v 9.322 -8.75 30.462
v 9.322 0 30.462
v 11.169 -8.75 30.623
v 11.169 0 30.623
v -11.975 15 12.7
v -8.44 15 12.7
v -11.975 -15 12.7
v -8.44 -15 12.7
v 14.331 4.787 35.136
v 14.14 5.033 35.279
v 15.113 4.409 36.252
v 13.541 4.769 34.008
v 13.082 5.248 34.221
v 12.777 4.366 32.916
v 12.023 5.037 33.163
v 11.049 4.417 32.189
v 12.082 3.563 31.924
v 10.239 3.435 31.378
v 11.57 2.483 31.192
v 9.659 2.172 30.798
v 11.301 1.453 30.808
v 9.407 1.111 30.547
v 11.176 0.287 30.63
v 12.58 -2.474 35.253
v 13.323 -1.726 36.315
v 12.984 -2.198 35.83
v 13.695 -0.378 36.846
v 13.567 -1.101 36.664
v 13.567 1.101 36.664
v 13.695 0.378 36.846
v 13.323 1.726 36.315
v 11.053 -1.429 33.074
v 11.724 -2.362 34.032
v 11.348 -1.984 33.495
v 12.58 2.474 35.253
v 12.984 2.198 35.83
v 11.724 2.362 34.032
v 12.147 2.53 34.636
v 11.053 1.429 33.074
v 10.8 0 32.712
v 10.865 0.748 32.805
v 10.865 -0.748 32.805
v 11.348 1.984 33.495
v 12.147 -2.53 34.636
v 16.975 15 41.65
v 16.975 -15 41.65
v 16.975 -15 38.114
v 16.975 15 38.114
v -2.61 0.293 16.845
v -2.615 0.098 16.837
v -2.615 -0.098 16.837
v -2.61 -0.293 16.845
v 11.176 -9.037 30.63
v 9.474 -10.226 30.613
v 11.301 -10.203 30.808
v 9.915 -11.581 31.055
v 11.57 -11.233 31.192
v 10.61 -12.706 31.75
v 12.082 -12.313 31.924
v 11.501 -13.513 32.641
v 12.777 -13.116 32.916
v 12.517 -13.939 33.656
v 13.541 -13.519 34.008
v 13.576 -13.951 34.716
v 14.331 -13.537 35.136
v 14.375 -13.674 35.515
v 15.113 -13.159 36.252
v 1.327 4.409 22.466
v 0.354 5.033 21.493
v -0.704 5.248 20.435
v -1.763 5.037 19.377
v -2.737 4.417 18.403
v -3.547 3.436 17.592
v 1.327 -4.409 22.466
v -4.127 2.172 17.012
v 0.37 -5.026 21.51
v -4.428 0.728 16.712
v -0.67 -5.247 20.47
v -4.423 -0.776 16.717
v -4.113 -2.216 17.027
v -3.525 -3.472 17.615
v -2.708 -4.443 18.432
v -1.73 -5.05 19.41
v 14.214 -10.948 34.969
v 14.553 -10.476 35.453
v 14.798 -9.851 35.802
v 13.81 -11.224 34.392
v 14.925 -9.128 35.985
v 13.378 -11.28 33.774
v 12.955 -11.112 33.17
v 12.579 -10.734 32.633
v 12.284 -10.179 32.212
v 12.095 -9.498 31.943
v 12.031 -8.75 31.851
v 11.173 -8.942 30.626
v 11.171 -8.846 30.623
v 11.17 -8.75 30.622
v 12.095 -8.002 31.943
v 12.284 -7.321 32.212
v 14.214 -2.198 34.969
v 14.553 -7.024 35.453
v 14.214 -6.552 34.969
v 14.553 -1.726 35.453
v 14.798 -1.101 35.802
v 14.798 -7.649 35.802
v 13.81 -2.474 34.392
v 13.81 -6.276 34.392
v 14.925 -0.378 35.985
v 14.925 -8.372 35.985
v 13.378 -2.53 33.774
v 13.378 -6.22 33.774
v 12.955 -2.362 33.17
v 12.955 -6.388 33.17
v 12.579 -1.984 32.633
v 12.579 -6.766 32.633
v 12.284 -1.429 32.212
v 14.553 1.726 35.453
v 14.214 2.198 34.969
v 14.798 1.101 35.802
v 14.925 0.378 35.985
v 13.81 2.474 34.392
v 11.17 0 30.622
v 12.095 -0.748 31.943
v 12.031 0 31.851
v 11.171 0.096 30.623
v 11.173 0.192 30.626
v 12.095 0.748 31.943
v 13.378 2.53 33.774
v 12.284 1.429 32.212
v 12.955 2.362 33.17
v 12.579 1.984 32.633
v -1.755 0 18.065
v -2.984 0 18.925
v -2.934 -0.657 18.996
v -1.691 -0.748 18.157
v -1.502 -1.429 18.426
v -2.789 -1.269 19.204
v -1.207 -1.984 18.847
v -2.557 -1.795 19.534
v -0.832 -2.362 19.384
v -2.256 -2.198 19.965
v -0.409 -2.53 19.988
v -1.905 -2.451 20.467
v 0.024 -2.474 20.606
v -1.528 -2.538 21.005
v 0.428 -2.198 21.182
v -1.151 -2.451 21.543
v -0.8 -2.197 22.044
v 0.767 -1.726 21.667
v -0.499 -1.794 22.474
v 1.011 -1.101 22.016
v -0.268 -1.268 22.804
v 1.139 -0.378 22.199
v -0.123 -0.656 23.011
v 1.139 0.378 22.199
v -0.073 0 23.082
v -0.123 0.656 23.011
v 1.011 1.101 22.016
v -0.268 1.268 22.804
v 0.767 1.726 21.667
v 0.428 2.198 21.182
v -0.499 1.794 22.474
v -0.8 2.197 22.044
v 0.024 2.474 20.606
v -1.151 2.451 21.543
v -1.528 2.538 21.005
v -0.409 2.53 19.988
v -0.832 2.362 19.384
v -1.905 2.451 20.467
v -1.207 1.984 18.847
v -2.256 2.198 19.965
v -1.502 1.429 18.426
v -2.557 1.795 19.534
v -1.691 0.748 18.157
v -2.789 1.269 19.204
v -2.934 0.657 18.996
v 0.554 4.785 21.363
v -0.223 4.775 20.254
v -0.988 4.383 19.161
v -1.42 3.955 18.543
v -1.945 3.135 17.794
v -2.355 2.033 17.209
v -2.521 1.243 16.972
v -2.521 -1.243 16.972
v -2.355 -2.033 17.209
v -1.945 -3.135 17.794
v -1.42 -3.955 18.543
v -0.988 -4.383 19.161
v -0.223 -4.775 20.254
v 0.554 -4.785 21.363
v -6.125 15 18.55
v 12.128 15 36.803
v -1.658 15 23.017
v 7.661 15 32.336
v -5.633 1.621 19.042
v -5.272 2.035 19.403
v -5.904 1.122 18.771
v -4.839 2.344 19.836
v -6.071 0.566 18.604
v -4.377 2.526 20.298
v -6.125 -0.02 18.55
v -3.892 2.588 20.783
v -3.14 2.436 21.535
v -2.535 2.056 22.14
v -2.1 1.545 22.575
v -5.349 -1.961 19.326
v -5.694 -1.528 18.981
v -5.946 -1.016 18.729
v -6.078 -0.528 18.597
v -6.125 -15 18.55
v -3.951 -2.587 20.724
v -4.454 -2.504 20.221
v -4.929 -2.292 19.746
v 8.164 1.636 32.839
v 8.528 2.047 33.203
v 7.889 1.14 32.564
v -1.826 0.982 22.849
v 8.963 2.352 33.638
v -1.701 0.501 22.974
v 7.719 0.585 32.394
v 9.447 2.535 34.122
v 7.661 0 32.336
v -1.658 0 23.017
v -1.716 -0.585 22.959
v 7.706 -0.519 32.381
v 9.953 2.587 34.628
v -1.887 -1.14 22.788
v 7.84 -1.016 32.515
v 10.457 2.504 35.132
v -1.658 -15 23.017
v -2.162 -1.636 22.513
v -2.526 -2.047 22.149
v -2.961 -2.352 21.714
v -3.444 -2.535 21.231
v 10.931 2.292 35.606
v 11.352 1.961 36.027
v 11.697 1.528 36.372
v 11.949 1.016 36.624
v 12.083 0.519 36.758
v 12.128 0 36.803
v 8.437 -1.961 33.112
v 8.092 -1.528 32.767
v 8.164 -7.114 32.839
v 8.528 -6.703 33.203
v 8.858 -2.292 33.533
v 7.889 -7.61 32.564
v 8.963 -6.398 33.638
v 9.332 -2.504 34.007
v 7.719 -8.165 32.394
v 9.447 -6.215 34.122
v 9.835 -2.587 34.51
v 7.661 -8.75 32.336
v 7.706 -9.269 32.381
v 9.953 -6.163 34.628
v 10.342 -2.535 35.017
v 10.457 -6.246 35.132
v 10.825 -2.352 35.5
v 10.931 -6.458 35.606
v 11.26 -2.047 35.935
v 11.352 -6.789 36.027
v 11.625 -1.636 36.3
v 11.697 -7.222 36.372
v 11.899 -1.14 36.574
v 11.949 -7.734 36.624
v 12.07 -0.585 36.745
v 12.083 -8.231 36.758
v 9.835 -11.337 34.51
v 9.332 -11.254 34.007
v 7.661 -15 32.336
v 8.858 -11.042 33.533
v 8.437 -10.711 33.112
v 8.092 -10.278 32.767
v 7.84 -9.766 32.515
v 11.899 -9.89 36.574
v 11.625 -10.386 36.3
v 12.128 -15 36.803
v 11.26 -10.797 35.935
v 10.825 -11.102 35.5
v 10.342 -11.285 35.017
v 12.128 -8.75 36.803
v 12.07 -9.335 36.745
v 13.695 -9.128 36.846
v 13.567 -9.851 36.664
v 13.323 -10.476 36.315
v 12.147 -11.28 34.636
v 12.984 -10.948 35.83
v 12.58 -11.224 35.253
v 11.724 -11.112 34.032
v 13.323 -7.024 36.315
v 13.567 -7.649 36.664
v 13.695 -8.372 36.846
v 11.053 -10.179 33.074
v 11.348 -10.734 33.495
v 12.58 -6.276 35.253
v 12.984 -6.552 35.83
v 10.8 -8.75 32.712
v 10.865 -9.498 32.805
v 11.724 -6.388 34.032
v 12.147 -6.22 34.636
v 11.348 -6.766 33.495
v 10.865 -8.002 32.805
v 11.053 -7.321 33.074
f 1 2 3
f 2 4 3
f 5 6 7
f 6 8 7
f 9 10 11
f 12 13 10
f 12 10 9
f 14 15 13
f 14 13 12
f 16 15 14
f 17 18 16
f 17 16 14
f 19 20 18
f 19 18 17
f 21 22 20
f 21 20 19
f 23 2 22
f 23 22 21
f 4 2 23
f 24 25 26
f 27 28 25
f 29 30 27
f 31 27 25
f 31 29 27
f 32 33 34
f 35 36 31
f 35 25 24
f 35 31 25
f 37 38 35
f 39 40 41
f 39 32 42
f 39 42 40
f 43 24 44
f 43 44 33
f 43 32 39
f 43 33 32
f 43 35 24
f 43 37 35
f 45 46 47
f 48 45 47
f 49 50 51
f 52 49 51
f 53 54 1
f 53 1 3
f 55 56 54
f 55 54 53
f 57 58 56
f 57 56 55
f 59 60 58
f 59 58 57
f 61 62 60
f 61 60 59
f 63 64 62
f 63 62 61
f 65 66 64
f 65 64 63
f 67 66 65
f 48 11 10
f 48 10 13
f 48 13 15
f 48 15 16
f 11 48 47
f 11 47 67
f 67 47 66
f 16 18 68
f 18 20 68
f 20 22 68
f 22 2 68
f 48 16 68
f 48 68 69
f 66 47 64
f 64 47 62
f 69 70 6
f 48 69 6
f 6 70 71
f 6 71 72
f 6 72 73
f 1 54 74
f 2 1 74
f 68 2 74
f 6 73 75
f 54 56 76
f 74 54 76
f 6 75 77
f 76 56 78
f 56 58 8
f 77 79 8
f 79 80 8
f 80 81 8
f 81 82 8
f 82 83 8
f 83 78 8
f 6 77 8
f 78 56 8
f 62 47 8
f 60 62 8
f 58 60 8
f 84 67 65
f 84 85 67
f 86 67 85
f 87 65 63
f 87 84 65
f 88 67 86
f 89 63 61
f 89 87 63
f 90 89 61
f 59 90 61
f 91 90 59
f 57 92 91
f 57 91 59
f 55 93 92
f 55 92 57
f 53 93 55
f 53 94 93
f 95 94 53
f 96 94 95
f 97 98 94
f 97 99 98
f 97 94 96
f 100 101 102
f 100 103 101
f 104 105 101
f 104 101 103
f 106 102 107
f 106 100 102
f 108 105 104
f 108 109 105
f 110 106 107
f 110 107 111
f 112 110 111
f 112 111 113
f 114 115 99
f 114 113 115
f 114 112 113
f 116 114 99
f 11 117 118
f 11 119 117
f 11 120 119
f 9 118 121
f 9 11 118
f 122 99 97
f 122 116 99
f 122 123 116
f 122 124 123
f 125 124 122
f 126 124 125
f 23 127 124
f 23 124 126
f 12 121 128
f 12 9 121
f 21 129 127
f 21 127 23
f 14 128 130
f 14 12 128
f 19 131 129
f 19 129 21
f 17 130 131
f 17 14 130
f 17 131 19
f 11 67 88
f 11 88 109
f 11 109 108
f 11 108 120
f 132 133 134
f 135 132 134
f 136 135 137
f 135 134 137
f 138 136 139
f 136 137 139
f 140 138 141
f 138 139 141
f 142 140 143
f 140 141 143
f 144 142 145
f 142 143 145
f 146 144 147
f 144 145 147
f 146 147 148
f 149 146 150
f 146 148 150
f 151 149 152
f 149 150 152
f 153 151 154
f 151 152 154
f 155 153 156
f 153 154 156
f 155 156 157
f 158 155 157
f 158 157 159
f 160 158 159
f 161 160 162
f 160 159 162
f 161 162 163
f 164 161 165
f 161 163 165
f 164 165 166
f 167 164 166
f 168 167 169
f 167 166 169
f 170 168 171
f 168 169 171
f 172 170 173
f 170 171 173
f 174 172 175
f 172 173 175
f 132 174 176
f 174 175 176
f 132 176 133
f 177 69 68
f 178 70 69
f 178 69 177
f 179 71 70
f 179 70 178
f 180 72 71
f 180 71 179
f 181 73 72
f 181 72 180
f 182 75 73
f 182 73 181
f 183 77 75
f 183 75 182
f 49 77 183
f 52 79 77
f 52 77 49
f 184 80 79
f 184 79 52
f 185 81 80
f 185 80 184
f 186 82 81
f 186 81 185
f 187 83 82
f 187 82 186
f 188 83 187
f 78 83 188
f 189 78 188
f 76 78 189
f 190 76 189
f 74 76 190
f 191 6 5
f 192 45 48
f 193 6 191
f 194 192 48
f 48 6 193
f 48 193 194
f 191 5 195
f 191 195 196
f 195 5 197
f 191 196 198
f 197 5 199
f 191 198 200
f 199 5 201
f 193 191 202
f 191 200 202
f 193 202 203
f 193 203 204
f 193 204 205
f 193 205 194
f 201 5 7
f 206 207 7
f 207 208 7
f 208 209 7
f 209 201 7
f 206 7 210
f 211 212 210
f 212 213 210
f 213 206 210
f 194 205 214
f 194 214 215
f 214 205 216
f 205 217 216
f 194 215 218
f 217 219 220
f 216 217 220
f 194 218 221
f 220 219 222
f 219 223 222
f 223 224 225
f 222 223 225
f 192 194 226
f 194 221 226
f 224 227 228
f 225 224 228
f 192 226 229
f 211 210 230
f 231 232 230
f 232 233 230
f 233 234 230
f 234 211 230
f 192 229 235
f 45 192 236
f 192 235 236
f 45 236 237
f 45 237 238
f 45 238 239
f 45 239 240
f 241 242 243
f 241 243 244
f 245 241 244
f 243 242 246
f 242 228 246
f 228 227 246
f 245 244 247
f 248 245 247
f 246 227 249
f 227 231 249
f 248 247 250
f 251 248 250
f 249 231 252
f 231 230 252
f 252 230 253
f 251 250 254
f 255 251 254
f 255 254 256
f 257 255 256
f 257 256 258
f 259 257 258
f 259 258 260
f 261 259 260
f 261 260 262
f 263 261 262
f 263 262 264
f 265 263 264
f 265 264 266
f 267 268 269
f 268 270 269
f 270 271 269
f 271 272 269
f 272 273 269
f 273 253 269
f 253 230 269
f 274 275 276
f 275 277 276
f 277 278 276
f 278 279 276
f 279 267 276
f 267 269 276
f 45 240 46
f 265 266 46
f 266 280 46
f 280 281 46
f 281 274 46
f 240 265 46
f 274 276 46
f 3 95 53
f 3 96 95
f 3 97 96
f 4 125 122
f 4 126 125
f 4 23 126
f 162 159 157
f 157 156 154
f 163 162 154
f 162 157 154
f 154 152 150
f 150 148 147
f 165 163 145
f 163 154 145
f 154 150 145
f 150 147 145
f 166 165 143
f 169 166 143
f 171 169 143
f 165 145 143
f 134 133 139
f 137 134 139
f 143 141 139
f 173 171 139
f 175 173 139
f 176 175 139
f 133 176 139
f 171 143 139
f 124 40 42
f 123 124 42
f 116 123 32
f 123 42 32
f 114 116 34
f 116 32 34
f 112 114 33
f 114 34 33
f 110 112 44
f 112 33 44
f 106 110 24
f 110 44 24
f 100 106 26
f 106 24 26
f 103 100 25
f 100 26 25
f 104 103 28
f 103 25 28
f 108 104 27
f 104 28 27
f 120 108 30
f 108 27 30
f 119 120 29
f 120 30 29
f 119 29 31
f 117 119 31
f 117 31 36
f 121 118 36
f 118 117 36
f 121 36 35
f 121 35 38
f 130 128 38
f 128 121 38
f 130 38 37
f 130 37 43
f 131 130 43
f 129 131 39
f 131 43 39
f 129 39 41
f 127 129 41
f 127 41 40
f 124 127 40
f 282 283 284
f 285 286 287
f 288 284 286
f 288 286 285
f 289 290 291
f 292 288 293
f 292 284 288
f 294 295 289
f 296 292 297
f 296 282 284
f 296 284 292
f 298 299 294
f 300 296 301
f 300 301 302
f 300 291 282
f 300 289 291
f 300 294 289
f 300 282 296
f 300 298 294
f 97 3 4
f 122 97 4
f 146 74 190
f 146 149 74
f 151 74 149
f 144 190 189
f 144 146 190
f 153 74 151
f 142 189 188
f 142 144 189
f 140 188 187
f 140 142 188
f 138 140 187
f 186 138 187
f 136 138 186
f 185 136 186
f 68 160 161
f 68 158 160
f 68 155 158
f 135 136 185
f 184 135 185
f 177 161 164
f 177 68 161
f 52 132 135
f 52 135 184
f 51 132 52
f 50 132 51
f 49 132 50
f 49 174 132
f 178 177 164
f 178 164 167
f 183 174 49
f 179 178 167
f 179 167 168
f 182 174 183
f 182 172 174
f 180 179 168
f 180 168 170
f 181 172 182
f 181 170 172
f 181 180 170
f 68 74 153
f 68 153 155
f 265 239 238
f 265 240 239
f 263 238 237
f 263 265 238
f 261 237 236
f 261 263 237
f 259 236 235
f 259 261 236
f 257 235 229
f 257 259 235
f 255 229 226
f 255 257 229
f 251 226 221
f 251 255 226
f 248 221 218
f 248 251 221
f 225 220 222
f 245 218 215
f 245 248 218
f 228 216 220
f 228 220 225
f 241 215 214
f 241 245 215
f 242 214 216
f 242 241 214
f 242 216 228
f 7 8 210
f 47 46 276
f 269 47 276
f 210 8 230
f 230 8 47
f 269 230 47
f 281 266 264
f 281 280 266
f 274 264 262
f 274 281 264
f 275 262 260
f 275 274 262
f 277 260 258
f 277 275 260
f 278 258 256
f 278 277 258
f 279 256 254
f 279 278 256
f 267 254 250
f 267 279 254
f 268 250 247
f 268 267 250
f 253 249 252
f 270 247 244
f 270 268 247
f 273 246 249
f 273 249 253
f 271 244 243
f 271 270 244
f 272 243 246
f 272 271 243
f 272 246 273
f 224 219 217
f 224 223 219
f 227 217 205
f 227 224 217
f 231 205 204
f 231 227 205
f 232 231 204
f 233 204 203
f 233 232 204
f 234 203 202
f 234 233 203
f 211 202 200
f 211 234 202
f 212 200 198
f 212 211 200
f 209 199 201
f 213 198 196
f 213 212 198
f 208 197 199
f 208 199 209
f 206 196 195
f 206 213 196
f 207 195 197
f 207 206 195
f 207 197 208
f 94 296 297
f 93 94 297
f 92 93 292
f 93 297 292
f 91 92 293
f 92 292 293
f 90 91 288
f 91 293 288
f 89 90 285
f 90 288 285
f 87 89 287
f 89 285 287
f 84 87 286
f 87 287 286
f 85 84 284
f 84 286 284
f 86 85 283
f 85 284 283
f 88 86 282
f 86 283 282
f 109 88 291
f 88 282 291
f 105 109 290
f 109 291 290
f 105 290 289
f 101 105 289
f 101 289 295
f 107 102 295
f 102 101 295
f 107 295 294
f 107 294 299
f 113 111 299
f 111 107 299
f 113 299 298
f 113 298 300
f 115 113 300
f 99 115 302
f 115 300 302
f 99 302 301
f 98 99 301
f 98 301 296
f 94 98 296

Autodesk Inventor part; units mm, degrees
ref_plane "YZ Plane" through (0, 0, 0) normal (1, 0, 0) x (0, 1, 0)
ref_plane "Work Plane1" through (-24.9, -24.9, 7.7) normal (0, 0, 1) x (1, 0, 0)
sketch "Sketch1" plane through (0, 0, 0) normal (0, 0, 1) x (0, 1, 0)
  circle A0 centre (20.9, 10) radius 1.875 projected
  circle A1 centre (-20.9, 10) radius 1.875 projected
  circle A2 centre (20.9, -10) radius 1.875 projected
  circle A3 centre (-20.9, -10) radius 1.875 projected
  circle A4 centre (-14.4, -20.8) radius 2.0675 projected
  circle A5 centre (14.4, -20.8) radius 2.0675 projected
  circle A6 centre (14.4, 20.8) radius 2.0675 projected
  circle A7 centre (-14.4, 20.8) radius 2.0675 projected
  line L0 (-16.9, -16.9) -> (-16.9, 16.9) projected
  line L1 (-16.9, 16.9) -> (16.9, 16.9) projected
  line L2 (16.9, 16.9) -> (16.9, -16.9) projected
  line L3 (16.9, -16.9) -> (-16.9, -16.9) projected
  line L4 (24.9, 17.05) -> (22.55, 17.05) projected
  line L5 (22.55, 17.05) -> (17.05, 22.55) projected
  line L6 (17.05, 22.55) -> (17.05, 24.9) projected
  line L7 (17.05, 24.9) -> (-17.05, 24.9) projected
  line L8 (-17.05, 24.9) -> (-17.05, 22.55) projected
  line L9 (-17.05, 22.55) -> (-22.55, 17.05) projected
  line L10 (-22.55, 17.05) -> (-24.9, 17.05) projected
  line L11 (-24.9, 17.05) -> (-24.9, -17.05) projected
  line L12 (-24.9, -17.05) -> (-22.55, -17.05) projected
  line L13 (-22.55, -17.05) -> (-17.05, -22.55) projected
  line L14 (-17.05, -22.55) -> (-17.05, -24.9) projected
  line L15 (-17.05, -24.9) -> (17.05, -24.9) projected
  line L16 (17.05, -24.9) -> (17.05, -22.55) projected
  line L17 (17.05, -22.55) -> (22.55, -17.05) projected
  line L18 (22.55, -17.05) -> (24.9, -17.05) projected
  line L19 (24.9, -17.05) -> (24.9, 17.05) projected
  line L20 (16.975, -24.825) -> (-16.975, -24.825)
  line L21 (-16.975, -24.825) -> (-16.975, -22.5189)
  line L22 (-16.975, -22.5189) -> (-22.5189, -16.975)
  line L23 (-22.5189, -16.975) -> (-24.825, -16.975)
  line L24 (-24.825, -16.975) -> (-24.825, 16.975)
  line L25 (-24.825, 16.975) -> (-22.5189, 16.975)
  line L26 (-22.5189, 16.975) -> (-16.975, 22.5189)
  line L27 (-16.975, 22.5189) -> (-16.975, 24.825)
  line L28 (-16.975, 24.825) -> (16.975, 24.825)
  line L29 (16.975, 24.825) -> (16.975, 22.5189)
  line L30 (16.975, 22.5189) -> (22.5189, 16.975)
  line L31 (22.5189, 16.975) -> (24.825, 16.975)
  line L32 (24.825, 16.975) -> (24.825, -16.975)
  line L33 (24.825, -16.975) -> (22.5189, -16.975)
  line L34 (22.5189, -16.975) -> (16.975, -22.5189)
  line L35 (16.975, -22.5189) -> (16.975, -24.825)
  dimension "d5" = 0.075
extrude "Extrusion1" add sketch "Sketch1" along normal blind 2.5 from surface at 7.7 contours A0 | A1 | A2 | A3 | A4 | A5 | A6 | A7 | L0 L1 L2 L3 | L20 L21 L22 L23 L24 L25 L26 L27 L28 L29 L30 L31 L32 L33 L34 L35
sketch "Sketch2" plane through (0, 0, 0) normal (0, 1, 0) x (-1, 0, 0)
  line L0 (16.975, 10.2) -> (-16.975, 10.2) projected
  line L1 (-16.975, 7.7) -> (-16.975, 10.2) projected
  line L2 (16.975, 7.7) -> (-16.975, 7.7) projected
  line L3 (16.975, 7.7) -> (16.975, 10.2) projected
  line L4 (16.975, 7.7) -> (-16.975, 41.65)
  line L5 (16.975, 7.7) -> (64.9876, 7.7) construction
  line L6 (-16.975, 41.65) -> (-16.975, 10.2)
  line L7 (-20.5105, 41.65) -> (10.9395, 10.2)
  line L8 (7.4039, 10.2) -> (-24.0461, 41.65)
  line L9 (-19.475, 12.7) -> (19.475, 12.7)
  line L10 (19.475, 12.7) -> (19.475, 5.2)
  line L11 (19.475, 5.2) -> (-19.475, 5.2)
  line L12 (-19.475, 5.2) -> (-19.475, 12.7)
  line L13 (-16.975, 41.65) -> (-24.825, 41.65)
  line L14 (-24.825, 41.65) -> (-24.825, 10.2)
  line L15 (-24.825, 10.2) -> (-16.975, 10.2)
  line L16 (-16.975, 10.2) -> (-16.975, 41.65)
  point P0 (0, 0)
  point P1 (14.475, 10.2)
  point P2 (-16.975, 38.1145)
  point P3 (-16.975, 34.5789)
  point P4 (8.4395, 12.7)
  point P5 (11.975, 12.7)
  point P6 (-19.475, 10.2)
  point P7 (-16.975, 12.7)
  point P8 (-16.975, 10.2)
  dimension "d6" = 135
  dimension "d9" = 2.5
  dimension "d10" = 2.5
  dimension "d13" = 2.5
extrude "Extrusion2" add sketch "Sketch2" along normal mid plane 30 contours L7 L9 L4 L0 | L0 L8 L9 L7 | L0 L6 L9 L8 | L9 L8 L6 L7 | L7 L6 L4 L9 | L15 L12 L9 L6 | L9 L6 L8 | L7 L13 L6 | L6 L8 L13 L7 | L9 L12 L15 L14 L13 L8 L6
extrude "Extrusion3" cut sketch "Sketch2" along normal mid plane 30 contours L7 L9 L4 L0 | L0 L8 L9 L7 | L9 L8 L6 L7 | L7 L13 L6 | L6 L8 L13 L7
ref_plane "Work Plane2" through (24.825, 0, 41.65) normal (0.9848078, 0, -0.1736482) x (0, 1, 0)
sketch "Sketch3" plane through (20.7643, -15, 18.6207) normal (0.9848078, 0, -0.1736482) x (-0.1736482, 0, -0.9848078)
  line L0 (10.902, 0) -> (-18.5396, 0) projected
  line L1 (10.902, 0) -> (10.902, 30) projected
  line L2 (-18.5396, 30) -> (10.902, 30) projected
  line L3 (-18.5396, 15) -> (10.902, 15)
  line L4 (6.1812, 6.25) -> (-13.8188, 6.25)
  line L5 (-13.8188, 6.25) -> (-13.8188, 23.75)
  line L6 (-13.8188, 23.75) -> (6.1812, 23.75)
  line L7 (6.1812, 23.75) -> (6.1812, 6.25)
  line L8 (6.1812, 6.25) -> (-13.8188, 23.75) construction
  line L9 (-13.8188, 6.25) -> (6.1812, 23.75) construction
  circle A0 centre (-13.8188, 6.25) radius 2.5875
  circle A1 centre (-13.8188, 6.25) radius 5.0875
  line L10 (-3.8188, 15) -> (-3.8188, 6.25)
  line L11 (-3.8188, 10.625) -> (-13.8188, 10.625)
  line L12 (-8.8188, 10.625) -> (-8.8188, 6.25)
  circle A2 centre (-13.8188, 15) radius 2.5875
  circle A3 centre (-13.8188, 15) radius 5.0875
  circle A4 centre (-3.8188, 15) radius 5.0875
  circle A5 centre (-3.8188, 15) radius 2.5875
  line L13 (-18.9063, 6.25) -> (-18.9063, 15)
  line L14 (-8.7313, 15) -> (-8.7313, 6.25)
  line L15 (-18.5396, 0) -> (-18.5396, 30) projected
  point P0 (21.9435, 15)
  dimension "d16" = 20
  dimension "d17" = 17.5
  dimension "d18" = 5.175
  dimension "d19" = 2.5
extrude "Extrusion4" cut sketch "Sketch3" along normal mid plane 50 contours A0 L5 L4 | L4 L5 A0 | A2 L3 L5 | L5 L3 A2 | A2 L5 L3 | A2 L3 L5
extrude "Extrusion5" cut sketch "Sketch3" along normal blind 4.25 and the other way blind 2.5 contours L15 A1 A3 L5 A0 L4 | A1 L15 | L13 A3 L15 A1 | L4 L12 A1 | A1 L12 L11 L14 | L15 A3 A1 | A3 L15 | L4 A0 L5 A3 A1 L12 | A1 L11 L12 | L11 A3 A4 L14 | A3 L15 L3 A2 L5 A1 | A1 L5 A3 | A3 L5 A2 L3 L15 | A4 L3 A2 L5 A3 | A3 L3 A4 | A0 L5 L4 | L4 L5 A0 | L11 L5 A1 | A3 L5 L11 | A1 L5 A2 L3 A4 A3 | A4 A3 L14 | A3 A4 L3 | A2 L3 L5 | L5 L3 A2 | A2 L5 L3 | A2 L3 L5
sketch "Sketch4" plane through (17.8921, 0, 2.3313) normal (0.9848078, 0, -0.1736482) x (0, 1, 0)
  line L0 (-15, 5.6387) -> (-15, 35.0803) projected
  line L1 (-15, 5.6387) -> (15, 5.6387) projected
  line L2 (15, 35.0803) -> (15, 5.6387) projected
  circle A0 centre (0, 14.3887) radius 2.5875
  circle A1 centre (0, 14.3887) radius 5.0875
  line L3 (-15, 35.0803) -> (15, 35.0803) projected
  line L4 (0, 5.6387) -> (0, 14.3887)
  point P0 (0, -5.1645)
  dimension "d25" = 5.175
  dimension "d26" = 2.5
  dimension "d37" = 8.75
extrude "Extrusion6" cut sketch "Sketch4" along normal mid plane 100 contours A0
extrude "Extrusion7" cut sketch "Sketch4" along normal blind 15 and the other way blind 10 contours A0 | A1
sketch "Sketch7" plane through (-3.5875, 0, 17.552) normal (0, 1, 0) x (-0.7071068, 0, -0.7071068)
  line L0 (-20.158, 0) -> (-26.4755, 0) projected
  line L1 (-0.6613, 0) -> (-6.9788, 0) projected
  line L2 (1.0892, 2.5) -> (-0.6613, 0) projected
  line L3 (-5.2283, 2.5) -> (1.0892, 2.5) projected
  line L4 (-5.2283, 2.5) -> (-6.9788, 0) projected
  line L5 (-18.4075, 2.5) -> (-20.158, 0) projected
  line L6 (-24.725, 2.5) -> (-18.4075, 2.5) projected
  line L7 (-24.725, 2.5) -> (-26.4755, 0) projected
  line L8 (-3.8201, 0) -> (-4.0701, 0)
  line L9 (-23.3168, 0) -> (-23.5668, 0)
  line L10 (-1.7448, -1.4254) -> (-6.7427, -0.5442)
  line L11 (-6.7427, -0.5442) -> (-6.3954, 1.4254)
  line L12 (-6.3954, 1.4254) -> (-1.3975, 0.5442)
  line L13 (-1.3975, 0.5442) -> (-1.7448, -1.4254)
  line L14 (-1.7448, -1.4254) -> (-6.3954, 1.4254) construction
  line L15 (-6.7427, -0.5442) -> (-1.3975, 0.5442) construction
  line L16 (-1.7448, -1.4254) -> (3.3302, -1.4254) construction
  line L17 (-21.2415, -1.4254) -> (-26.2394, -0.5442)
  line L18 (-26.2394, -0.5442) -> (-25.8921, 1.4254)
  line L19 (-25.8921, 1.4254) -> (-20.8942, 0.5442)
  line L20 (-20.8942, 0.5442) -> (-21.2415, -1.4254)
  line L21 (-21.2415, -1.4254) -> (-25.8921, 1.4254) construction
  line L22 (-26.2394, -0.5442) -> (-20.8942, 0.5442) construction
  line L23 (-21.2415, -1.4254) -> (-16.1665, -1.4254) construction
  line L24 (-27.1088, 3.1631) -> (-27.9771, -1.7609)
  line L25 (-27.9771, -1.7609) -> (-20.0247, -3.1631)
  line L26 (-20.0247, -3.1631) -> (-19.1565, 1.7609)
  line L27 (-19.1565, 1.7609) -> (-27.1088, 3.1631)
  line L28 (-7.6121, 3.1631) -> (-8.4804, -1.7609)
  line L29 (-8.4804, -1.7609) -> (-0.528, -3.1631)
  line L30 (-0.528, -3.1631) -> (0.3402, 1.7609)
  line L31 (0.3402, 1.7609) -> (-7.6121, 3.1631)
  line L32 (-0.6613, 0) -> (0.0297, 0)
  line L33 (-20.158, 0) -> (-19.467, 0)
  line L34 (-1.7448, -1.4254) -> (0.0297, 0)
  line L35 (-21.2415, -1.4254) -> (-19.467, 0)
  line L36 (-26.4755, 0) -> (-27.6666, 0)
  line L37 (-6.9788, 0) -> (-8.1699, 0)
  line L38 (-6.7427, -0.5442) -> (-8.1699, 0)
  line L39 (-26.2394, -0.5442) -> (-27.6666, 0)
  point P0 (-1.4934, 0)
  point P1 (-6.6467, 0)
  point P2 (-26.1434, 0)
  point P3 (-20.9901, 0)
  dimension "d70" = 0.25
  dimension "d71" = 0.25
  dimension "d72" = 5.075
  dimension "d73" = 170
  dimension "d74" = 2
  dimension "d75" = 5.075
  dimension "d76" = 170
  dimension "d77" = 2
  dimension "d78" = 1.5
  dimension "d79" = 1.5
extrude "Extrusion10" add sketch "Sketch7" along normal mid plane 30 contours L0 L18 L7 L19 L20 | L20 L19 L7 L6 L27 L26 L5 L0 | L0 L7 L18 | L26 L27 L6 L5 | L1 L11 L4 L12 L13 | L13 L12 L4 L3 L31 L30 L2 L1 | L1 L4 L11 | L30 L31 L3 L2
extrude "Extrusion11" cut sketch "Sketch7" along normal mid plane 5.075 contours L0 L20 L17 L18 | L0 L18 L7 L19 L20 | L18 L19 L7 | L1 L13 L10 L11 | L1 L11 L4 L12 L13 | L11 L12 L4
sketch "Sketch8" plane through (13.713, -15.0375, 36.8684) normal (0.819152, 0, -0.5735764) x (-0.5735764, 0, -0.819152)
  line L0 (0, 12.5) -> (0, 17.575) projected
  line L1 (5.075, 17.575) -> (5.075, 12.5) projected
  line L2 (0, 12.5) -> (5.075, 12.5) projected
  line L3 (5.075, 17.575) -> (0, 17.575) projected
  line L4 (2.5375, 12.5) -> (2.5375, 17.575)
  circle A0 centre (2.5375, 15.0375) radius 2.5375
  circle A1 centre (2.5375, 15.0375) radius 4.0375
  circle A2 centre (2.5375, 6.2875) radius 4.0375
  circle A3 centre (2.5375, 6.2875) radius 2.5375
  line L5 (-1.5, 6.2875) -> (-1.5, 15.0375)
  line L6 (6.575, 6.2875) -> (6.575, 15.0375)
  point P0 (38.0663, 15.0375)
  dimension "d86" = 5.075
  dimension "d87" = 1.5
  dimension "d90" = 8.75
extrude "Extrusion12" cut sketch "Sketch8" along normal blind 1.5 contours A0 L4 | L4 A0 | A3
extrude "Extrusion13" add sketch "Sketch8" along normal blind 1.5 contours L0 A0 L2 | L0 L3 A0 | A0 L1 L2 | L3 L1 A0 | A1 | L6 A2 L5 A1 | A2
sketch "Sketch9" plane through (-0.0732, -2.5375, 23.0821) normal (0.819152, 0, -0.5735764) x (-0.5735764, 0, -0.819152)
  line L0 (0, 0) -> (0, 5.075) projected
  line L1 (0, 0) -> (5.075, 0) projected
  line L2 (5.075, 5.075) -> (5.075, 0) projected
  line L3 (5.075, 5.075) -> (0, 5.075) projected
  line L4 (2.5375, 0) -> (2.5375, 5.075)
  circle A0 centre (2.5375, 2.5375) radius 2.5375
  circle A1 centre (2.5375, 2.5375) radius 4.0375
  point P0 (18.8658, 2.5375)
  dimension "d99" = 5.075
  dimension "d100" = 1.5
extrude "Extrusion14" add sketch "Sketch9" along normal blind 1.5 contours L0 A0 L1 | L0 L3 A0 | A0 L2 L1 | L3 L2 A0 | A1
chamfer "Chamfer1" distance 1.21 angle 45 3 edges at (11.9583, -12.4749, 33.0978) (-1.8279, 3.7249, 19.3115) (-1.8279, -3.7249, 19.3115)
sketch "Sketch10" plane through (0, 0, 0) normal (0, 1, 0) x (-1, 0, 0)
  line L0 (8.4395, 12.7) -> (-16.975, 38.1145) projected
  line L1 (-16.975, 38.1145) -> (-16.975, 41.65) projected
  line L2 (-16.975, 41.65) -> (11.975, 12.7) projected
  line L3 (11.975, 12.7) -> (8.4395, 12.7) projected
  line L4 (-11.1764, 30.6305) -> (-15.1128, 36.2522) projected
  line L5 (-11.1689, 30.6232) -> (-11.1764, 30.6305) projected
  line L6 (-15.1128, 36.2522) -> (-9.3221, 30.4616) projected
  line L7 (-1.3265, 22.466) -> (2.6099, 16.8443) projected
  line L8 (2.6099, 16.8443) -> (2.6099, 16.8443) projected
  line L9 (2.6099, 16.8443) -> (-1.3265, 22.466) projected
  line L10 (-1.3265, 22.466) -> (-1.3265, 22.466) projected
  line L11 (-24.0461, 41.65) -> (7.4039, 10.2) projected
  line L12 (-24.825, 10.2) -> (7.4039, 10.2) projected
  line L13 (-24.825, 10.2) -> (-24.825, 41.65) projected
  line L14 (-24.825, 41.65) -> (-24.0461, 41.65) projected
  line L15 (22.5189, 10.2) -> (24.825, 10.2) projected
  line L16 (24.825, 7.7) -> (24.825, 10.2) projected
  line L17 (22.5189, 7.7) -> (24.825, 7.7) projected
  line L18 (22.5189, 7.7) -> (22.5189, 10.2) projected
  line L19 (16.975, 10.2) -> (22.5189, 10.2) projected
  line L20 (22.5189, 7.7) -> (22.5189, 10.2) projected
  line L21 (16.975, 7.7) -> (22.5189, 7.7) projected
  line L22 (16.975, 7.7) -> (16.975, 10.2) projected
  line L23 (-16.975, 10.2) -> (16.975, 10.2) projected
  line L24 (16.975, 7.7) -> (16.975, 10.2) projected
  line L25 (-16.975, 7.7) -> (16.975, 7.7) projected
  line L26 (-16.975, 7.7) -> (-16.975, 10.2) projected
  line L27 (-22.5189, 10.2) -> (-16.975, 10.2) projected
  line L28 (-16.975, 7.7) -> (-16.975, 10.2) projected
  line L29 (-22.5189, 7.7) -> (-16.975, 7.7) projected
  line L30 (-22.5189, 7.7) -> (-22.5189, 10.2) projected
  line L31 (-24.825, 10.2) -> (-22.5189, 10.2) projected
  line L32 (-22.5189, 7.7) -> (-22.5189, 10.2) projected
  line L33 (-24.825, 7.7) -> (-22.5189, 7.7) projected
  line L34 (-24.825, 7.7) -> (-24.825, 10.2) projected
  line L35 (2.6099, 16.8443) -> (8.4395, 12.7)
  line L36 (-11.1764, 30.6305) -> (-1.3265, 22.466)
  line L37 (-11.1689, 30.6232) -> (-9.3221, 30.4616) projected
  point P0 (0, 0)
extrude "Extrusion15" cut sketch "Sketch10" along normal mid plane 50 contours L11 L12 L13 L14 | L23 L22 L25 L26 L12 | L26 L29 L30 L12 | L19 L18 L21 L22 | L12 L30 L33 L34 | L15 L16 L17 L18
properties part number "Mirror Plate"
